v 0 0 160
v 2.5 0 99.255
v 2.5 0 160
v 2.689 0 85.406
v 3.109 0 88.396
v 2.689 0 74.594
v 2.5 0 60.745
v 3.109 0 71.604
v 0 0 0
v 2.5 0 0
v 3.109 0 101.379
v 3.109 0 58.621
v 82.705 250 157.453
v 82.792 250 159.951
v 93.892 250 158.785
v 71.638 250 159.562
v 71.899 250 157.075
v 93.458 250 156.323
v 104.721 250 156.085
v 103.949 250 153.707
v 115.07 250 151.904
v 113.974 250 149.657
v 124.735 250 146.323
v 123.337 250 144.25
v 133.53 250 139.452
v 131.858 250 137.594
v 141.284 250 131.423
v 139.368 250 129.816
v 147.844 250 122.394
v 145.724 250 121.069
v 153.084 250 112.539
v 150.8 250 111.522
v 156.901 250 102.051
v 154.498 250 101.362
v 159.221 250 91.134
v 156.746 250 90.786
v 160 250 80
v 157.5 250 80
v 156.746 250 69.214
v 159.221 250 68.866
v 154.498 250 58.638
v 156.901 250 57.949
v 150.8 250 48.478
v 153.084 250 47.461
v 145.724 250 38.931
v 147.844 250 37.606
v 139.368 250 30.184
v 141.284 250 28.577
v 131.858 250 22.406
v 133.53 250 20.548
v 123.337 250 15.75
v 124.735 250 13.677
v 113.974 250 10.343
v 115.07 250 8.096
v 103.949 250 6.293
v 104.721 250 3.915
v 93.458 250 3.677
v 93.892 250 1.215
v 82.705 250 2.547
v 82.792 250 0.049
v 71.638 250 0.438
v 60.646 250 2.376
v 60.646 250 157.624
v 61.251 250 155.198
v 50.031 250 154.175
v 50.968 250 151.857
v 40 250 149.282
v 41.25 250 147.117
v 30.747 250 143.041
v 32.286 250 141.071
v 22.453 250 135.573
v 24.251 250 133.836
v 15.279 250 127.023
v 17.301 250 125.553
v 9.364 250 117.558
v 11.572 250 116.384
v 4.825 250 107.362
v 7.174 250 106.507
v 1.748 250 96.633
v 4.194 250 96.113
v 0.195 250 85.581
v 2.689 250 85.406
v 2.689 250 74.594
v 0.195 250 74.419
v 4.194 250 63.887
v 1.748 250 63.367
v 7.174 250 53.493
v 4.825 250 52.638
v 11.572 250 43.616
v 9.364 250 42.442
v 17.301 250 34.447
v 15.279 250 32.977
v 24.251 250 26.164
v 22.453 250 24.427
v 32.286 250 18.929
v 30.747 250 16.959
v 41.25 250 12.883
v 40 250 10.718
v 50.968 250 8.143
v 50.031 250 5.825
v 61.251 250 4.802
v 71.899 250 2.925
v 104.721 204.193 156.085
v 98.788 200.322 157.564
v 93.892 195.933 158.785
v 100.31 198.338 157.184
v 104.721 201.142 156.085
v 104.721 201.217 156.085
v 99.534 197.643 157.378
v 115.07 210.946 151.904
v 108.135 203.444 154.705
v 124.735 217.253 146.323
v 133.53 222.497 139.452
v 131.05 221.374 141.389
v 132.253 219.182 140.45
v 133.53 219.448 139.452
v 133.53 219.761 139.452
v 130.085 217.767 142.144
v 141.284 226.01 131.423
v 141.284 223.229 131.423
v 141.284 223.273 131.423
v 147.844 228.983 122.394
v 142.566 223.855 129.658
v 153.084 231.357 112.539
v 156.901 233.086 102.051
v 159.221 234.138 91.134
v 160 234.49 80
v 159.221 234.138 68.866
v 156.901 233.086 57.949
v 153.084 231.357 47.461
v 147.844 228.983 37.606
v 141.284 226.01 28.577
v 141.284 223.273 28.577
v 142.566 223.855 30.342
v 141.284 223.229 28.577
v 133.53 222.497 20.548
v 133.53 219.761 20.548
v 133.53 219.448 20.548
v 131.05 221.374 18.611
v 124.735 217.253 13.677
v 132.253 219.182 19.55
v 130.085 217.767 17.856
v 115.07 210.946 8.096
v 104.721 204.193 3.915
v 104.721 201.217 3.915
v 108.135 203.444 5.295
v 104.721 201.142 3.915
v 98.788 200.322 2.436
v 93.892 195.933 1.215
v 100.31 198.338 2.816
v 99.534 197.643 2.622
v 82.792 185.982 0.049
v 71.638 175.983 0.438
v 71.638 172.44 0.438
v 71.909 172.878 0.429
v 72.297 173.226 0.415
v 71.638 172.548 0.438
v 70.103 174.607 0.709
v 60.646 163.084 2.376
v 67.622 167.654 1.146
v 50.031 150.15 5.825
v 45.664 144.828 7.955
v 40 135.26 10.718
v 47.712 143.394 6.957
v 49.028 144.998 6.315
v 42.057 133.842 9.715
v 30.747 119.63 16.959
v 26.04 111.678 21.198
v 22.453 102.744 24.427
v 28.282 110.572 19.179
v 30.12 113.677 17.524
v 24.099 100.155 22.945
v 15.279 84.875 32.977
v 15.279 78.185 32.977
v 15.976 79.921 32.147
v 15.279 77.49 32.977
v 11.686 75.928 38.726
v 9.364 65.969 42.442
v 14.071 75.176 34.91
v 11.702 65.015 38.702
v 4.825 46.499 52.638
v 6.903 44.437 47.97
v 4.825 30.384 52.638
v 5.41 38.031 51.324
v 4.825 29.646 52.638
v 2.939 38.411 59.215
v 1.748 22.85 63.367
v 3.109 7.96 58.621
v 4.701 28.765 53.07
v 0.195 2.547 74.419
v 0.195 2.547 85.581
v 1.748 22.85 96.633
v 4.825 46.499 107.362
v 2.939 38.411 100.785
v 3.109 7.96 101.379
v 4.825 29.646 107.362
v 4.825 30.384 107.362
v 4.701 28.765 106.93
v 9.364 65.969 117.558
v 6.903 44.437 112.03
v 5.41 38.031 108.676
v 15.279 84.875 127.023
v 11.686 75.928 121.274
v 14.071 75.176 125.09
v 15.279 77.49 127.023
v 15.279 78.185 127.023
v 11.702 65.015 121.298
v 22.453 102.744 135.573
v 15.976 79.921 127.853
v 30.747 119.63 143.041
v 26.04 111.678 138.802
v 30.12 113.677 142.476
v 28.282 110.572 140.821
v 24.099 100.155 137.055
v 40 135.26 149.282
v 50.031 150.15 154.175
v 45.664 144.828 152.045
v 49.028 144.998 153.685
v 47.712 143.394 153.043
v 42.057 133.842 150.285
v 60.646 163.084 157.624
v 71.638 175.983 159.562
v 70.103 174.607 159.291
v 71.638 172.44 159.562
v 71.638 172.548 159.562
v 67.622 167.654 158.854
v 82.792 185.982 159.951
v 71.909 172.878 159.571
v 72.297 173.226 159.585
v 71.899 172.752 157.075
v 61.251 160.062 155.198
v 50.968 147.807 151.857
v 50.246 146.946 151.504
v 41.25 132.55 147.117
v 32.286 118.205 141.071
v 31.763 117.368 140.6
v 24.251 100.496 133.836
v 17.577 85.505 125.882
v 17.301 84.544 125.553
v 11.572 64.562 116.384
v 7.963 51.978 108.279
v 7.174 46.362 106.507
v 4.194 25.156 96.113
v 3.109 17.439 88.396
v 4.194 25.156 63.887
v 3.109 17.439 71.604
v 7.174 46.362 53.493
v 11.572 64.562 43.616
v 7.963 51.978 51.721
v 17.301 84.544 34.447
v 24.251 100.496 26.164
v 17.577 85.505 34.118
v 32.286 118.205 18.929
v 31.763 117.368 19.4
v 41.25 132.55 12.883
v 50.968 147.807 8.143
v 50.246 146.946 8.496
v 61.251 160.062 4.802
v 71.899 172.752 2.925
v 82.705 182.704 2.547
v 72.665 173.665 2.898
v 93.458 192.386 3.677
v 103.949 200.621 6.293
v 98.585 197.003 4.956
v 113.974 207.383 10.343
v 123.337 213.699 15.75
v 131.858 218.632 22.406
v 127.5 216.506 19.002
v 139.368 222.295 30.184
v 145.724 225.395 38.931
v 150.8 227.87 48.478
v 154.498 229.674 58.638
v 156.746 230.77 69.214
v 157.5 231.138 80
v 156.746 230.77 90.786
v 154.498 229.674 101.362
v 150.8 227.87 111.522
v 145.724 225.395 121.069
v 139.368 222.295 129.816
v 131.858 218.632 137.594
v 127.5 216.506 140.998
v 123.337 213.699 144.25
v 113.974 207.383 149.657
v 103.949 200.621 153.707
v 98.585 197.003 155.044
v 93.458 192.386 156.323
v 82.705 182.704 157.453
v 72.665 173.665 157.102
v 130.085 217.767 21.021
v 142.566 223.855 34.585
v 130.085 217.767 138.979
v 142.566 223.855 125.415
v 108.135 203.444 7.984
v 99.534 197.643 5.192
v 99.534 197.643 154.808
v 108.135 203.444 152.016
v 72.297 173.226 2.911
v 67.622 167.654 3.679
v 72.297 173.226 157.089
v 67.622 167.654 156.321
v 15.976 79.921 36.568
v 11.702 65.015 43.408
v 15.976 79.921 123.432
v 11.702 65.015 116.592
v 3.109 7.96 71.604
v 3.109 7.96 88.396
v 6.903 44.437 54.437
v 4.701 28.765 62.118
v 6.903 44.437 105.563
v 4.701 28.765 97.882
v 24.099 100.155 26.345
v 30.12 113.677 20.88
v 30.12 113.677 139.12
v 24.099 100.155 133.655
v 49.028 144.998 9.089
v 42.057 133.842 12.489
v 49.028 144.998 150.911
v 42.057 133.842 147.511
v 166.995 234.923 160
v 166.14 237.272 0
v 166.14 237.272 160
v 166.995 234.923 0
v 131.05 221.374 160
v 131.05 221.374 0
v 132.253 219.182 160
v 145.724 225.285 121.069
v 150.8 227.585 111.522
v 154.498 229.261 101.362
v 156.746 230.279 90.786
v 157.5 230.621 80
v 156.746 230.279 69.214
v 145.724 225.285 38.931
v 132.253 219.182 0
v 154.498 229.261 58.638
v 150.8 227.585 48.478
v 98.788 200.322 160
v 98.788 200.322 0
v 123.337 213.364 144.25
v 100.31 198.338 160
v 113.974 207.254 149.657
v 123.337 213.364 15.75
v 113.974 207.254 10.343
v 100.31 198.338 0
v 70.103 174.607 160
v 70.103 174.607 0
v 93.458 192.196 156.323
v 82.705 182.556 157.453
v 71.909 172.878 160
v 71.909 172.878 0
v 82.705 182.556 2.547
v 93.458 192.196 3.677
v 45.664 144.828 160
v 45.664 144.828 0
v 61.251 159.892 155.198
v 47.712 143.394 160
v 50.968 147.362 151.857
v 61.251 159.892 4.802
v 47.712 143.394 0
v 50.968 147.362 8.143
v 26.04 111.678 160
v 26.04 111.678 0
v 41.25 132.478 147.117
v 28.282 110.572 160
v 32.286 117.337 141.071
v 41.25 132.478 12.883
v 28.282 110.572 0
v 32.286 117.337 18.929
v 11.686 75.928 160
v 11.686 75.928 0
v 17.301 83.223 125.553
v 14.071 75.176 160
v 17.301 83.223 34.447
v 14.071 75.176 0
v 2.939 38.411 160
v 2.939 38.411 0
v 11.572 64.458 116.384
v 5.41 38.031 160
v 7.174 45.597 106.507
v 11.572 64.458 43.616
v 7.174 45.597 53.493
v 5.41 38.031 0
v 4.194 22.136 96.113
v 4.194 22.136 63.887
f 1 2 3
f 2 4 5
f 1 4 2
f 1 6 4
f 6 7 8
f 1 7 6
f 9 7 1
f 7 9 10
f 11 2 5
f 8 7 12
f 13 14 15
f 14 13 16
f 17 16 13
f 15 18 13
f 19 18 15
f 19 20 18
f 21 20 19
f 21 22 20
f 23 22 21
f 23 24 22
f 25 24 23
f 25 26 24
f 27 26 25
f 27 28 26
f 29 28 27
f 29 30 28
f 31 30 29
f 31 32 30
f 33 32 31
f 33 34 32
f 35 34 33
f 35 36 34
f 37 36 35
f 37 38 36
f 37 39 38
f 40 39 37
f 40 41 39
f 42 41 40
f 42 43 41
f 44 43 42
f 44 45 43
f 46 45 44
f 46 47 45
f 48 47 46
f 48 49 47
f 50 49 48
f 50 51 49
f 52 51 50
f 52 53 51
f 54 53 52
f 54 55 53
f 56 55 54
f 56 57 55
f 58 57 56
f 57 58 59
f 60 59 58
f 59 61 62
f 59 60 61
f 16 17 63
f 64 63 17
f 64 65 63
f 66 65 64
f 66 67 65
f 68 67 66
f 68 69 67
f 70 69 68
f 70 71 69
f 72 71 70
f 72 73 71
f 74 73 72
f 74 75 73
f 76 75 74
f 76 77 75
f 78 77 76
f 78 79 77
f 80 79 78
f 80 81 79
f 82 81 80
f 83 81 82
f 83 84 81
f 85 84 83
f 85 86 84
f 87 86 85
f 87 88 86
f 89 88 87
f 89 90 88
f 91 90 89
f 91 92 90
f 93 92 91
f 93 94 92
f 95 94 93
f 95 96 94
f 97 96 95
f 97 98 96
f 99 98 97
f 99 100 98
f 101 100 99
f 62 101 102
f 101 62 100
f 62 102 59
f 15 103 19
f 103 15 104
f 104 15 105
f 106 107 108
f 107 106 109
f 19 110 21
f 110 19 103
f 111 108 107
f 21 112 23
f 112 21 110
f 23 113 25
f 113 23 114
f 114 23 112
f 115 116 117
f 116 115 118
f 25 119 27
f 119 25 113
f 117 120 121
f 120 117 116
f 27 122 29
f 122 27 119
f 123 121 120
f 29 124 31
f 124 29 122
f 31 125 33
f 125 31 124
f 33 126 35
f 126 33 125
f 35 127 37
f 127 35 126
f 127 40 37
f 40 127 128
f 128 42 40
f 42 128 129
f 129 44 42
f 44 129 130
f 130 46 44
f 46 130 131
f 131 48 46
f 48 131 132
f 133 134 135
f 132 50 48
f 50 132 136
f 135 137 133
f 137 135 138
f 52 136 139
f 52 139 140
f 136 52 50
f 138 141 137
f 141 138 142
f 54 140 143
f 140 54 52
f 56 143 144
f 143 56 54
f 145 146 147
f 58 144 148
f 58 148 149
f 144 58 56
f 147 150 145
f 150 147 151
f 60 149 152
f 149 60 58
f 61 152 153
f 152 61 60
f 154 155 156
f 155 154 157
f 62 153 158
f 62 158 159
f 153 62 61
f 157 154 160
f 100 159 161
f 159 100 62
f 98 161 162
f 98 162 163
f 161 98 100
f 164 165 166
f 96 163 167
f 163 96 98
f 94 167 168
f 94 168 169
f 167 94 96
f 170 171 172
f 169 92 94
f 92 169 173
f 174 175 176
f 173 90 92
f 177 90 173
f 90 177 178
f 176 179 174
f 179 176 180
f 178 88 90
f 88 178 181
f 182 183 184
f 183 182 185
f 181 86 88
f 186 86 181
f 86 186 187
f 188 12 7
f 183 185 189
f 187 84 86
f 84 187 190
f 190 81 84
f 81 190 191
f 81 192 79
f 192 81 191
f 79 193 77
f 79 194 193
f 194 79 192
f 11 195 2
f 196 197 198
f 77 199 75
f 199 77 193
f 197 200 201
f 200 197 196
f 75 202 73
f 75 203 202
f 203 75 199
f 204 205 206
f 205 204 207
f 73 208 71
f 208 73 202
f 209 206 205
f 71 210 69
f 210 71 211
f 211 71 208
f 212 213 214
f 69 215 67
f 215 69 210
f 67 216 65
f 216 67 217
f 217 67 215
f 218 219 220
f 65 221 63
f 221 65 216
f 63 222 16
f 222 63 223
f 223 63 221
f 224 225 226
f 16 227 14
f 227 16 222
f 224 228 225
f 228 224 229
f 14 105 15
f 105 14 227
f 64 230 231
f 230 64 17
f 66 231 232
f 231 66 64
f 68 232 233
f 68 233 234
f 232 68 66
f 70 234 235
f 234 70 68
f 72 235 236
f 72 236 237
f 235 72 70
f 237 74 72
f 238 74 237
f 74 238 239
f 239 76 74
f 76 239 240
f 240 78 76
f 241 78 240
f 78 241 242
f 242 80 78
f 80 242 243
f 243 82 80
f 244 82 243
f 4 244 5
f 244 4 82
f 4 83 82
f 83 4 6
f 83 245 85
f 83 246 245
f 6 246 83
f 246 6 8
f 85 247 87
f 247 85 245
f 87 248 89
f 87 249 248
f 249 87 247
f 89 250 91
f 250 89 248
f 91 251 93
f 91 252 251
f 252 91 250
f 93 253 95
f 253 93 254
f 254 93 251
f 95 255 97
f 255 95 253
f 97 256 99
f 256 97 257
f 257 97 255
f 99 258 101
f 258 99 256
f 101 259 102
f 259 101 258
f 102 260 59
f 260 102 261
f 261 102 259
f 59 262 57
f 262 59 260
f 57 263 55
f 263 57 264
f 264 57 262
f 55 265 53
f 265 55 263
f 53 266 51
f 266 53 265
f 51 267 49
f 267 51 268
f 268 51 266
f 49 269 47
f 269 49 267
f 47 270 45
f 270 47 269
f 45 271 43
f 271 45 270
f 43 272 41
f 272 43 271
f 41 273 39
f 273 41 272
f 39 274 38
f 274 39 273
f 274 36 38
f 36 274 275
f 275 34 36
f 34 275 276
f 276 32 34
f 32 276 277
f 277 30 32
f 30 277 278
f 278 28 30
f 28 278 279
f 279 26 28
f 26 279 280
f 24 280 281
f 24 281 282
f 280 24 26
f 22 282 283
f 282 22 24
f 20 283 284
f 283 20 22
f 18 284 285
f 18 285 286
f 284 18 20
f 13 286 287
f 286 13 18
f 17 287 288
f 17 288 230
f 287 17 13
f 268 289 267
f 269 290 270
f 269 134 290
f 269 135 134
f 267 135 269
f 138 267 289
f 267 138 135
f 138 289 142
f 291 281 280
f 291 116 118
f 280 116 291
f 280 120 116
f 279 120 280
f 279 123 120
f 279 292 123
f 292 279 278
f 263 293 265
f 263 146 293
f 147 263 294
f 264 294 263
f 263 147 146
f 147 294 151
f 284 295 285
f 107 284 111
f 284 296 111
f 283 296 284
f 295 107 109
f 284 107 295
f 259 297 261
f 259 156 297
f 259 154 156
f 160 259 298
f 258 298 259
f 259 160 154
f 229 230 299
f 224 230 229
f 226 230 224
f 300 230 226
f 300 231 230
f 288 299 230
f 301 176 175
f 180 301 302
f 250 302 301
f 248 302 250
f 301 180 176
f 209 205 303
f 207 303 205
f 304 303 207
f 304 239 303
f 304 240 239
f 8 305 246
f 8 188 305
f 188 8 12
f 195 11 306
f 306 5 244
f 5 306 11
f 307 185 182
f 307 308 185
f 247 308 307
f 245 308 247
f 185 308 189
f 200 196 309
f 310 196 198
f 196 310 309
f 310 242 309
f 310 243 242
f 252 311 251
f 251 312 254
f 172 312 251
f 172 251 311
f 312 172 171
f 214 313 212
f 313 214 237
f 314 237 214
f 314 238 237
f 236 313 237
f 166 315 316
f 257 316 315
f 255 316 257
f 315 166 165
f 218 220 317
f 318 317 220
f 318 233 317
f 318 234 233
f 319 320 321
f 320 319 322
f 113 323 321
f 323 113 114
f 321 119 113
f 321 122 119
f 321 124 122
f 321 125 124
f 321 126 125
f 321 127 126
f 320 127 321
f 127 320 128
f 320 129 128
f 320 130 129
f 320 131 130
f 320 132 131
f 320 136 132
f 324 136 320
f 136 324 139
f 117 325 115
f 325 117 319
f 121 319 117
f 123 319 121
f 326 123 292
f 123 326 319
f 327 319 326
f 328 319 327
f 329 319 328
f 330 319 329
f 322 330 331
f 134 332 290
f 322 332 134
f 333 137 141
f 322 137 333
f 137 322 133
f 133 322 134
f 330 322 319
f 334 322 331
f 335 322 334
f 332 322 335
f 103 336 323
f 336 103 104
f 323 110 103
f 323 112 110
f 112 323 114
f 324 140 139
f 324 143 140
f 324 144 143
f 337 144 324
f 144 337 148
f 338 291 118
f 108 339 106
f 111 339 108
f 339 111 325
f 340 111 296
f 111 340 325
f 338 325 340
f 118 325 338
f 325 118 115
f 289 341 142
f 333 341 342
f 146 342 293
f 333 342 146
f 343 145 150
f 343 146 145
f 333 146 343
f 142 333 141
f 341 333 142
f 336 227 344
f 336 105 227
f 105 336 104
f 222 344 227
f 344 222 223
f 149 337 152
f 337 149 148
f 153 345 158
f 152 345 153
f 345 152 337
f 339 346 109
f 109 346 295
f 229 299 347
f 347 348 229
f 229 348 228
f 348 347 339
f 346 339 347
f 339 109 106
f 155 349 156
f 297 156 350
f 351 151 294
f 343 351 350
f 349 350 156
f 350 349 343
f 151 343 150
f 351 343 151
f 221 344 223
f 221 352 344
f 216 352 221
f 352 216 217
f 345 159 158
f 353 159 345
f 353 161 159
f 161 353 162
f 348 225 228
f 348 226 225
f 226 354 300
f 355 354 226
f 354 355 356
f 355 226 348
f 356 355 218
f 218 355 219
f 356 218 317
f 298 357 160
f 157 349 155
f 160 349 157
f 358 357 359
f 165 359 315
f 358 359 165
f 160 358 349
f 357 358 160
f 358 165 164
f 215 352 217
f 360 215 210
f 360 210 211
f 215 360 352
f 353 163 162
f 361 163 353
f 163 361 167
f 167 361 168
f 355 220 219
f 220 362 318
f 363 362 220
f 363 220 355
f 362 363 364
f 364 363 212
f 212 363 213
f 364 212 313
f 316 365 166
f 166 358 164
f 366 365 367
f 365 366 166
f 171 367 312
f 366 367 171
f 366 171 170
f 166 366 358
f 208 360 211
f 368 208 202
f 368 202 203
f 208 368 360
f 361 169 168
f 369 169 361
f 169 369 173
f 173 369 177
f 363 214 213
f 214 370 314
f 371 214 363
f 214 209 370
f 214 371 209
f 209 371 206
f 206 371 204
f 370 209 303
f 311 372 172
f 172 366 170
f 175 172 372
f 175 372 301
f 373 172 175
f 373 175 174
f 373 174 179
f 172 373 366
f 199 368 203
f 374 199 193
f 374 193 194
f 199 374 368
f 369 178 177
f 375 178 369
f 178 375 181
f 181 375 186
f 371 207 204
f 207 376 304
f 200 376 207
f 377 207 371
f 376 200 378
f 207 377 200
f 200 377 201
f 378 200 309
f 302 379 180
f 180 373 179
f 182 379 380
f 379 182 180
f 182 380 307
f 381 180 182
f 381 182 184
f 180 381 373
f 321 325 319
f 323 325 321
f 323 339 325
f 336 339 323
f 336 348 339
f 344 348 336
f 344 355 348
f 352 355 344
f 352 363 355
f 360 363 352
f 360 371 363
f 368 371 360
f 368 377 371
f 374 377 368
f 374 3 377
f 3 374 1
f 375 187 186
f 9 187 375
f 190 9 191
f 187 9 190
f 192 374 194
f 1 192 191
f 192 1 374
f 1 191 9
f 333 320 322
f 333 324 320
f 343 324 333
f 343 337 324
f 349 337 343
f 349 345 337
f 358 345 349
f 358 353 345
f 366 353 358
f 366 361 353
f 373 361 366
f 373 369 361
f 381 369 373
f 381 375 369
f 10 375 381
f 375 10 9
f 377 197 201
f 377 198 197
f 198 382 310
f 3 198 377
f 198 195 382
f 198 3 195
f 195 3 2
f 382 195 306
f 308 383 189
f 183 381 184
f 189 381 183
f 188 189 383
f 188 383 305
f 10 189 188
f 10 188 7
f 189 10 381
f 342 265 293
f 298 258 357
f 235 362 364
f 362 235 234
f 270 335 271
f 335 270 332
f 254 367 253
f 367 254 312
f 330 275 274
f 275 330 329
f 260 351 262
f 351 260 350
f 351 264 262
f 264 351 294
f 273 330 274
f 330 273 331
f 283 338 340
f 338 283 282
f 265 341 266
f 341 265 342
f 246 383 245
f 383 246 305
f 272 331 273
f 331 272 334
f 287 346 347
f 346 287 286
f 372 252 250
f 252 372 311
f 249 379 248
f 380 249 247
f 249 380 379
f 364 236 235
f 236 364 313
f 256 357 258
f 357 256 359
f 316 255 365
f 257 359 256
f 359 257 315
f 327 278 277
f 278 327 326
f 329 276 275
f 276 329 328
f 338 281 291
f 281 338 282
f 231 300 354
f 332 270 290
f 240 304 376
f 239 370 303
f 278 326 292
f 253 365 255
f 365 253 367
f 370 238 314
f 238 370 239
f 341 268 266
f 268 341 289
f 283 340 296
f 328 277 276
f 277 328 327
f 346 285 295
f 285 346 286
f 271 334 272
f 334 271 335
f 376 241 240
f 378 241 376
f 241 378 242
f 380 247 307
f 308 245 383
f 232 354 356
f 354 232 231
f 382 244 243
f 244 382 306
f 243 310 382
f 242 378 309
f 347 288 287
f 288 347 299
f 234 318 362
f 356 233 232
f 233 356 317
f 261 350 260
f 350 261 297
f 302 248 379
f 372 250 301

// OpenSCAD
include <../libs/pw_primitives.scad>;

eps = 0.01;
sphere_r = 5;
cube_x = 20;
cube_y = 40;
cube_z = 50;

$fn=45;

// experiment in making a chamfered edge at the top of a solid, say a
// cube, that can then be 'cut out' of a surface to provide a guide
// when inserting tools, say.
// The logic is to build a 'negative object' around the orignal shape,
// but curved using a minkowski join with a sphere at the top, then this
// is removed from a cube larger than the original by the radius of the
// sphere.  Without an effective 'offset' tool on 3D objects, its hard
// to do this without knowing the size and shape of the original object.
* difference() {
    cube([cube_x+sphere_r*2, cube_y+sphere_r*2, cube_z-eps]);
    translate([0, 0, 0]) minkowski(convexity=3) {
        difference() {
            cube([cube_x+sphere_r*2, cube_y+sphere_r*2, cube_z-sphere_r]);
            translate([sphere_r, sphere_r, -eps]) 
              cube([cube_x, cube_y, cube_z]);
        }
        sphere(r=sphere_r);
    };
}

length = 250;
thickness = 5;
i_width = 120; o_width = i_width + thickness*2;
i_height = 160; o_height = i_height + thickness*2;
cyl_diam = 500; cyl_rad = cyl_diam / 2;

// A rectangular 160x120 tube going tangentially into the
// side of a 500mm diameter cylinder.
* difference() {
    translate([0, 0, o_height]) rotate([0, 90, 0]) 
      rectangular_tube(i_height, i_width, thickness, length);
    translate([length, cyl_rad + thickness, -eps]) 
      cylinder(h=o_height+eps*2, d=cyl_diam);
}

// Circular feed-in tube of OD 160mm going tangentially into the
// side of a 500mm diameter cylinder.
translate([160/2, 0, 160/2]) union() {
    difference() {
        rotate([-90, 0, 0]) pipe_rt(250, 160/2, 5/2);
        translate([500/2+2.5-160/2, 0, -160/2]) cylinder(h=160, d=500);
    }
    difference() {
        // (radius, thickness, height, angle)
        translate([500/2+2.5-160/2, 0, -160/2]) rotate([0, 0, 180-70])
          pipe_rt_segment(500/2, 5/2, 160, 70);
        rotate([-90, 0, 0]) cylinder(h=250, d=155);
    }
}
// a section of 150mm pipe with angled vanes inside it to spin the
// airflow.
* union() {
    pipe_rt(100, 155/2, 5/2);
    translate([0, 0, 95]) pipe_rt(20, 160/2, 5/2);
    translate([0, 0, 90]) hollow_cone_rt(5, 155/2, 160/2, 5/2);
    difference() {
        linear_extrude(100, twist=45) union() {
            translate([-75+00, 0]) square([20.1, 2]);
            translate([+75-20, 0]) square([20.1, 2]);
            translate([0, -75+00]) square([2, 20.1]);
            translate([0, +75-20]) square([2, 20.1]);
        }
        translate([0, 0, -eps]) cylinder(h=20, d1=150, d2=110);
        translate([0, 0, 80]) cylinder(h=20+eps, d1=110, d2=150);
    }
}

// 45-degree rectangular feed-in to top of 150mm diameter tube.
// rectangular tube of same cross-sectional area as 150mm tube
// but half the height is 75 x 235 mm; here we use 80 x 240.
* union() {
    // the feed-in tube, minus the cylinder it's intersecting,
    // but only up to the cylinder.
    difference() {
        rotate([0, 0, 45]) translate([0, 0, 155]) 
          rotate([0, 90, 0]) rectangular_tube(80, 240, 2.5, 400);
        translate([-(240/sqrt(2)+10), 0, epsilon]) cube([240/sqrt(2), 240*sqrt(2), 155]);
        translate([0, 0, 155/2]) rotate([-90, 0, 0]) cylinder(h=430, d=150);
    };
    // the outlet tube, minus the rectangle intersecting it.
    difference() {
        translate([0, 0, 155/2]) rotate([-90, 0, 0]) pipe_rt(430, 155/2, 5/2);
        intersection() {
            rotate([0, 0, 45]) translate([0, 2.5, 152.5-80]) 
              cube([360, 240, 80]);
            cube([155, 430, 155]);
        }
    }
    // the end cap
    translate([0, 430-epsilon, 155/2]) rotate([-90, 0, 0]) cylinder(h=5, d=155);
}

// A rectangular duct resize from 160x120 to 240x80 in 200mm, plus 
* union() {
    translate([-126/2, -166/2, 0]) rectangular_tube(126, 166, 3, 20);
    translate([0, 0, 20]) difference() {
        rectangular_cone(120/2+3, 160/2+6, 240/2+6, 80/2+6, 200);
        translate([3, 3, -epsilon]) rectangular_cone(120/2, 160/2, 240/2, 80/2, 200+epsilo2);
    }
}
